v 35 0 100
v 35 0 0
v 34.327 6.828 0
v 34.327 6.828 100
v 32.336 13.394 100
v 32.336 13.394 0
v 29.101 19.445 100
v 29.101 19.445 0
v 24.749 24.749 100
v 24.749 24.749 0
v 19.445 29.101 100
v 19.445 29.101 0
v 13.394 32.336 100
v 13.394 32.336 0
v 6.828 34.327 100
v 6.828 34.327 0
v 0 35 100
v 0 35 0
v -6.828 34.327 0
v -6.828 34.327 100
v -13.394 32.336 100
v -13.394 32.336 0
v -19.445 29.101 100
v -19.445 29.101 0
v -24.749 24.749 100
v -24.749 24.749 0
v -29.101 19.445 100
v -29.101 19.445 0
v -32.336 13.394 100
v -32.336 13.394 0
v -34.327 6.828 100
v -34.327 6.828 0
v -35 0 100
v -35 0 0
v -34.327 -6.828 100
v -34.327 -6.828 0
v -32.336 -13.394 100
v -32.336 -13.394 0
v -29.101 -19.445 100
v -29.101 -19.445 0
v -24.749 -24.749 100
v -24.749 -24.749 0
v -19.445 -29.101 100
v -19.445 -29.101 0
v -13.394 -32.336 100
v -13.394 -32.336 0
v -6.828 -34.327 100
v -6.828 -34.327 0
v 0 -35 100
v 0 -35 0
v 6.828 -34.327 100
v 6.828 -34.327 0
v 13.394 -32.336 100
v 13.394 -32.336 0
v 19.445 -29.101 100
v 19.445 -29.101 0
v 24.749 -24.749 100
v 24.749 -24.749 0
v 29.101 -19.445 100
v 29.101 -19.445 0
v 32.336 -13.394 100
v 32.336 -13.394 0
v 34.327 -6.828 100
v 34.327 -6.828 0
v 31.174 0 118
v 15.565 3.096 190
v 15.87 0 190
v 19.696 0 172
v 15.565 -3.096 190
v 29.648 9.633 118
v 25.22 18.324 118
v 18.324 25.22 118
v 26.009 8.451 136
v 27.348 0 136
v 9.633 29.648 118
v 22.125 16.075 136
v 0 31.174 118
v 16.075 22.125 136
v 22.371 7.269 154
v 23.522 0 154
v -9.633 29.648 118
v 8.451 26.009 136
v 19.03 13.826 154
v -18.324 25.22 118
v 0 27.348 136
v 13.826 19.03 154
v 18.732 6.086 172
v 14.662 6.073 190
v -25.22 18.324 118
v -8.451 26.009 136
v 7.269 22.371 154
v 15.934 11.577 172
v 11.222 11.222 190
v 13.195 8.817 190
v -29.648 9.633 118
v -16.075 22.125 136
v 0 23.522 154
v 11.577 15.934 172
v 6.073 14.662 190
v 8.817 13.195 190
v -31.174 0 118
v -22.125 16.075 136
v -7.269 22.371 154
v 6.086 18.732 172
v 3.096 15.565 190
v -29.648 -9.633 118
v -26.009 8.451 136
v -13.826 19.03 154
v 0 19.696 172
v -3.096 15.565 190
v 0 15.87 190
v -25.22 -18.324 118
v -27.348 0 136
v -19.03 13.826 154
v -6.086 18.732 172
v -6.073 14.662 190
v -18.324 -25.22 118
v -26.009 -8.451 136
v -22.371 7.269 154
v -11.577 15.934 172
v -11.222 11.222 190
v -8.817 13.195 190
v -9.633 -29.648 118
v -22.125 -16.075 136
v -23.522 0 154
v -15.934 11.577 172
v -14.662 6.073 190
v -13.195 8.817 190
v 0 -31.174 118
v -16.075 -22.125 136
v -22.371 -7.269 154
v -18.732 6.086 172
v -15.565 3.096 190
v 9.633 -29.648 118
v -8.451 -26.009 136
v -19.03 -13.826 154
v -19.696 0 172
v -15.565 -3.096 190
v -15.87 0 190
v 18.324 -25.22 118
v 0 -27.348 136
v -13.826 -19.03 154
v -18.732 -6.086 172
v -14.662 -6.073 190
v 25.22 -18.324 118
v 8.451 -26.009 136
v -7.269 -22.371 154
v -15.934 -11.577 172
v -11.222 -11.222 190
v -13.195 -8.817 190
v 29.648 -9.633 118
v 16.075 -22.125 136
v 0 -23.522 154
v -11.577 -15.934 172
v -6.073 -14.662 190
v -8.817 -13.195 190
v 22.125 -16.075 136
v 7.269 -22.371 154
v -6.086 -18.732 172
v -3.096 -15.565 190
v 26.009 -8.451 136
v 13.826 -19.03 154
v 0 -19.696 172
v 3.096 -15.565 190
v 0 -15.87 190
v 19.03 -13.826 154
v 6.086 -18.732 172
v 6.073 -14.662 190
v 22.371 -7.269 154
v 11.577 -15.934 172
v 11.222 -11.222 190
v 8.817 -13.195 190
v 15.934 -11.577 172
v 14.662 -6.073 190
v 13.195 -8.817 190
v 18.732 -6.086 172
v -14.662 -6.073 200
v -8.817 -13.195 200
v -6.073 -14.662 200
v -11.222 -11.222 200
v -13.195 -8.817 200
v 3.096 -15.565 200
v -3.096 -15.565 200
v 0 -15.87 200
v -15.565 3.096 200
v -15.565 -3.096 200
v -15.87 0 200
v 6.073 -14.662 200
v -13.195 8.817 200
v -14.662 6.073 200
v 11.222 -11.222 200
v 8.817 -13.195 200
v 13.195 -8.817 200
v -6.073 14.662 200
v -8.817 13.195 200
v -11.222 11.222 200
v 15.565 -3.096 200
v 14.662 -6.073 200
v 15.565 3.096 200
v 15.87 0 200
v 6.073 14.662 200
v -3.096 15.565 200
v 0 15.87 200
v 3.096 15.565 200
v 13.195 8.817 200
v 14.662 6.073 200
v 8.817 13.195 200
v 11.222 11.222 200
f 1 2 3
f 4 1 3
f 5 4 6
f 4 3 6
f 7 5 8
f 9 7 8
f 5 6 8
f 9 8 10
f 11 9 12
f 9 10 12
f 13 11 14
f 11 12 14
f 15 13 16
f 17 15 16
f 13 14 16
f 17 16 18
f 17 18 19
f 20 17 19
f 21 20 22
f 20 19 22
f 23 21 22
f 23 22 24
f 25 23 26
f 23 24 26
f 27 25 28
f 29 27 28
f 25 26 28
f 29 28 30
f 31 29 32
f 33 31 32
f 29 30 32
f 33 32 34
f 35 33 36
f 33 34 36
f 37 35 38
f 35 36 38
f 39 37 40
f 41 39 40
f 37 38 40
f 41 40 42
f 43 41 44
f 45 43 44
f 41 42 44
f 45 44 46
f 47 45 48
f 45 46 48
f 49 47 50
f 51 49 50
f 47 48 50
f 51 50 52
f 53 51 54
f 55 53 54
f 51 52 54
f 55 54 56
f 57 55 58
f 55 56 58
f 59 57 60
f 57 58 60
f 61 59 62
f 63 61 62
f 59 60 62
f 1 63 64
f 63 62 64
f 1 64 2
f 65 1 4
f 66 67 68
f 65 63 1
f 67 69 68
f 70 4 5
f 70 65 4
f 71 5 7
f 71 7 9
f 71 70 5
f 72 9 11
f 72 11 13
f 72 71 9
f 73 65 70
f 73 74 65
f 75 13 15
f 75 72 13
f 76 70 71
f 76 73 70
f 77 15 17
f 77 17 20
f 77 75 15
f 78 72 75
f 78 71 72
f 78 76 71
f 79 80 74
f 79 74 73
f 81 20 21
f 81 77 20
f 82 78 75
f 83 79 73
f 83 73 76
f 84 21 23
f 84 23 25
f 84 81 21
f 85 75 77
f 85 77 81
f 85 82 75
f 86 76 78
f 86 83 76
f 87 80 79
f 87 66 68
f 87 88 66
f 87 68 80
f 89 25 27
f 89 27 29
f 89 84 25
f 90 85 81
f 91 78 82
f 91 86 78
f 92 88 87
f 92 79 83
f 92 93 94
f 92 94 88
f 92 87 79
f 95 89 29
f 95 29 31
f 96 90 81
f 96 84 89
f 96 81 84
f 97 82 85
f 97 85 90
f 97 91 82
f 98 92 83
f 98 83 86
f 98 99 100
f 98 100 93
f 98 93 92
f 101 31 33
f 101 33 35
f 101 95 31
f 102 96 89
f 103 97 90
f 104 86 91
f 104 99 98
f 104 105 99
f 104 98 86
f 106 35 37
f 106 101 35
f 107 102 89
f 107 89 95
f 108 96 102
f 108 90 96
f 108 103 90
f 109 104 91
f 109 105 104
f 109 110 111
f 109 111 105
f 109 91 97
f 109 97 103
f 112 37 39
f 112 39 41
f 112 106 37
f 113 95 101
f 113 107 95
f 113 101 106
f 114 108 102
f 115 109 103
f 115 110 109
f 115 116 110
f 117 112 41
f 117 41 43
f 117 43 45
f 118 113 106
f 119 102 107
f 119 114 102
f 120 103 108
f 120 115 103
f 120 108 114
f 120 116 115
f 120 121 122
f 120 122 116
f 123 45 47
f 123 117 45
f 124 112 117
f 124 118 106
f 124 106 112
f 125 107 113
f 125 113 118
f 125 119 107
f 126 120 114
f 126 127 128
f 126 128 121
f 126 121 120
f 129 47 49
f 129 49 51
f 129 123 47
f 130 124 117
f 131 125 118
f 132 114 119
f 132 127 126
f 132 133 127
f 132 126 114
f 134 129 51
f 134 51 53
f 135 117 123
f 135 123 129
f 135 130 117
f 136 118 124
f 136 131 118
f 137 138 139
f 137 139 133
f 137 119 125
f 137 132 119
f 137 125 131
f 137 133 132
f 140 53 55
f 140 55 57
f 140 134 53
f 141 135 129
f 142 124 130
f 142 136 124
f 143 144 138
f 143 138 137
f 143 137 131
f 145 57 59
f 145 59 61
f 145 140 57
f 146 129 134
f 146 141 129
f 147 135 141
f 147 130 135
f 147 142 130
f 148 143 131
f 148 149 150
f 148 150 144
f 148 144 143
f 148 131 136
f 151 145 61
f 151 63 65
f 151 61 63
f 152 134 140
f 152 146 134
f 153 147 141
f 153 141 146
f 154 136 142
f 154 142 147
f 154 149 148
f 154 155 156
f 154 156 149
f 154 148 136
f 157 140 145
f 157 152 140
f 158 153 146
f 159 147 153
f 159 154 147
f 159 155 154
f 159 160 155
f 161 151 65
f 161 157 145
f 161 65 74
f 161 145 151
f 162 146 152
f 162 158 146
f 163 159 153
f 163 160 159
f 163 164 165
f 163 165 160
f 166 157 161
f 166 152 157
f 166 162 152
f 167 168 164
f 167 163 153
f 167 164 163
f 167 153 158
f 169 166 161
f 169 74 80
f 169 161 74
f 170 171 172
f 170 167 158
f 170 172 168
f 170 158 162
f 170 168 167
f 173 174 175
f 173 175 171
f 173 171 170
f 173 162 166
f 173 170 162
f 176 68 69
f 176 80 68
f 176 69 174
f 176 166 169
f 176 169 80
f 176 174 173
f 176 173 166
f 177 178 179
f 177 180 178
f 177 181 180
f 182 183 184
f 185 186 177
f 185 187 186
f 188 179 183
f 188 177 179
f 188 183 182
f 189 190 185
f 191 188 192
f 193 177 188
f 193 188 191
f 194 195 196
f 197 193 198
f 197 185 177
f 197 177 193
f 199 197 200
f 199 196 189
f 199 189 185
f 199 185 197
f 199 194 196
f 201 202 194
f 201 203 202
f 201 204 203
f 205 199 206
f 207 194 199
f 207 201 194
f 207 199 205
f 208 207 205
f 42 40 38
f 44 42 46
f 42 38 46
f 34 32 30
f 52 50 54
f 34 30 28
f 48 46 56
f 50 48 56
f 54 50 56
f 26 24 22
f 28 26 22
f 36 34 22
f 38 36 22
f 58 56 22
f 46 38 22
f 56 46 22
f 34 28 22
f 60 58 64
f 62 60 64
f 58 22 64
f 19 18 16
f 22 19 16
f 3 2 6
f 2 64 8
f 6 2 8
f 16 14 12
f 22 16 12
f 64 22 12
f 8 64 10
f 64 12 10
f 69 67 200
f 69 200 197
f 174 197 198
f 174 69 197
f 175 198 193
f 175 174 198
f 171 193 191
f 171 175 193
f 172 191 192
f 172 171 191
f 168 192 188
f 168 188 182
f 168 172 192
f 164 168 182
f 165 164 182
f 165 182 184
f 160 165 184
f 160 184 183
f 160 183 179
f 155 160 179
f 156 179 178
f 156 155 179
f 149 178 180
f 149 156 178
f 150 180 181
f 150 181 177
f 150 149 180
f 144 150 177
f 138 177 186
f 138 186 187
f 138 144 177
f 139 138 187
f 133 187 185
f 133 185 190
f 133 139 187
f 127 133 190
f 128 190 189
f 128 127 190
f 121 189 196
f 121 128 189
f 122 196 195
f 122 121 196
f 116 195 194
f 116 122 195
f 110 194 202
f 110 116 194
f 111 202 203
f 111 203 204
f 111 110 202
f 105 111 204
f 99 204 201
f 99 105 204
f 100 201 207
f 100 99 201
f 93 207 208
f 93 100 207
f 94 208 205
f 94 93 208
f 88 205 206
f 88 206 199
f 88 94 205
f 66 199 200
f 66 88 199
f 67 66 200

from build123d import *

# Parameters (mm, degrees)
F0_R      = 35
F1_DEPTH  = 100
F1_FACE_R = 35
F2_DEPTH  = 90
F2_TAPER  = 12
F3_DEPTH  = 10


with BuildPart() as f1:
    # F0 (on Top) → F1 (new body)
    with BuildSketch(Plane.XY):
        Circle(F0_R)
    extrude(amount=F1_DEPTH)

    # F1_face (on face) → F2 (join)
    with BuildSketch(Plane.XY.offset(100)):
        Circle(F1_FACE_R)
    extrude(amount=F2_DEPTH, taper=F2_TAPER)

    # F3 (add): a face of the model
    f3_faces = [f1.faces().sort_by_distance(p)[0] for p in [
        (0, 0, 190),
    ]]
    extrude(f3_faces, amount=F3_DEPTH)


solid = f1.part
